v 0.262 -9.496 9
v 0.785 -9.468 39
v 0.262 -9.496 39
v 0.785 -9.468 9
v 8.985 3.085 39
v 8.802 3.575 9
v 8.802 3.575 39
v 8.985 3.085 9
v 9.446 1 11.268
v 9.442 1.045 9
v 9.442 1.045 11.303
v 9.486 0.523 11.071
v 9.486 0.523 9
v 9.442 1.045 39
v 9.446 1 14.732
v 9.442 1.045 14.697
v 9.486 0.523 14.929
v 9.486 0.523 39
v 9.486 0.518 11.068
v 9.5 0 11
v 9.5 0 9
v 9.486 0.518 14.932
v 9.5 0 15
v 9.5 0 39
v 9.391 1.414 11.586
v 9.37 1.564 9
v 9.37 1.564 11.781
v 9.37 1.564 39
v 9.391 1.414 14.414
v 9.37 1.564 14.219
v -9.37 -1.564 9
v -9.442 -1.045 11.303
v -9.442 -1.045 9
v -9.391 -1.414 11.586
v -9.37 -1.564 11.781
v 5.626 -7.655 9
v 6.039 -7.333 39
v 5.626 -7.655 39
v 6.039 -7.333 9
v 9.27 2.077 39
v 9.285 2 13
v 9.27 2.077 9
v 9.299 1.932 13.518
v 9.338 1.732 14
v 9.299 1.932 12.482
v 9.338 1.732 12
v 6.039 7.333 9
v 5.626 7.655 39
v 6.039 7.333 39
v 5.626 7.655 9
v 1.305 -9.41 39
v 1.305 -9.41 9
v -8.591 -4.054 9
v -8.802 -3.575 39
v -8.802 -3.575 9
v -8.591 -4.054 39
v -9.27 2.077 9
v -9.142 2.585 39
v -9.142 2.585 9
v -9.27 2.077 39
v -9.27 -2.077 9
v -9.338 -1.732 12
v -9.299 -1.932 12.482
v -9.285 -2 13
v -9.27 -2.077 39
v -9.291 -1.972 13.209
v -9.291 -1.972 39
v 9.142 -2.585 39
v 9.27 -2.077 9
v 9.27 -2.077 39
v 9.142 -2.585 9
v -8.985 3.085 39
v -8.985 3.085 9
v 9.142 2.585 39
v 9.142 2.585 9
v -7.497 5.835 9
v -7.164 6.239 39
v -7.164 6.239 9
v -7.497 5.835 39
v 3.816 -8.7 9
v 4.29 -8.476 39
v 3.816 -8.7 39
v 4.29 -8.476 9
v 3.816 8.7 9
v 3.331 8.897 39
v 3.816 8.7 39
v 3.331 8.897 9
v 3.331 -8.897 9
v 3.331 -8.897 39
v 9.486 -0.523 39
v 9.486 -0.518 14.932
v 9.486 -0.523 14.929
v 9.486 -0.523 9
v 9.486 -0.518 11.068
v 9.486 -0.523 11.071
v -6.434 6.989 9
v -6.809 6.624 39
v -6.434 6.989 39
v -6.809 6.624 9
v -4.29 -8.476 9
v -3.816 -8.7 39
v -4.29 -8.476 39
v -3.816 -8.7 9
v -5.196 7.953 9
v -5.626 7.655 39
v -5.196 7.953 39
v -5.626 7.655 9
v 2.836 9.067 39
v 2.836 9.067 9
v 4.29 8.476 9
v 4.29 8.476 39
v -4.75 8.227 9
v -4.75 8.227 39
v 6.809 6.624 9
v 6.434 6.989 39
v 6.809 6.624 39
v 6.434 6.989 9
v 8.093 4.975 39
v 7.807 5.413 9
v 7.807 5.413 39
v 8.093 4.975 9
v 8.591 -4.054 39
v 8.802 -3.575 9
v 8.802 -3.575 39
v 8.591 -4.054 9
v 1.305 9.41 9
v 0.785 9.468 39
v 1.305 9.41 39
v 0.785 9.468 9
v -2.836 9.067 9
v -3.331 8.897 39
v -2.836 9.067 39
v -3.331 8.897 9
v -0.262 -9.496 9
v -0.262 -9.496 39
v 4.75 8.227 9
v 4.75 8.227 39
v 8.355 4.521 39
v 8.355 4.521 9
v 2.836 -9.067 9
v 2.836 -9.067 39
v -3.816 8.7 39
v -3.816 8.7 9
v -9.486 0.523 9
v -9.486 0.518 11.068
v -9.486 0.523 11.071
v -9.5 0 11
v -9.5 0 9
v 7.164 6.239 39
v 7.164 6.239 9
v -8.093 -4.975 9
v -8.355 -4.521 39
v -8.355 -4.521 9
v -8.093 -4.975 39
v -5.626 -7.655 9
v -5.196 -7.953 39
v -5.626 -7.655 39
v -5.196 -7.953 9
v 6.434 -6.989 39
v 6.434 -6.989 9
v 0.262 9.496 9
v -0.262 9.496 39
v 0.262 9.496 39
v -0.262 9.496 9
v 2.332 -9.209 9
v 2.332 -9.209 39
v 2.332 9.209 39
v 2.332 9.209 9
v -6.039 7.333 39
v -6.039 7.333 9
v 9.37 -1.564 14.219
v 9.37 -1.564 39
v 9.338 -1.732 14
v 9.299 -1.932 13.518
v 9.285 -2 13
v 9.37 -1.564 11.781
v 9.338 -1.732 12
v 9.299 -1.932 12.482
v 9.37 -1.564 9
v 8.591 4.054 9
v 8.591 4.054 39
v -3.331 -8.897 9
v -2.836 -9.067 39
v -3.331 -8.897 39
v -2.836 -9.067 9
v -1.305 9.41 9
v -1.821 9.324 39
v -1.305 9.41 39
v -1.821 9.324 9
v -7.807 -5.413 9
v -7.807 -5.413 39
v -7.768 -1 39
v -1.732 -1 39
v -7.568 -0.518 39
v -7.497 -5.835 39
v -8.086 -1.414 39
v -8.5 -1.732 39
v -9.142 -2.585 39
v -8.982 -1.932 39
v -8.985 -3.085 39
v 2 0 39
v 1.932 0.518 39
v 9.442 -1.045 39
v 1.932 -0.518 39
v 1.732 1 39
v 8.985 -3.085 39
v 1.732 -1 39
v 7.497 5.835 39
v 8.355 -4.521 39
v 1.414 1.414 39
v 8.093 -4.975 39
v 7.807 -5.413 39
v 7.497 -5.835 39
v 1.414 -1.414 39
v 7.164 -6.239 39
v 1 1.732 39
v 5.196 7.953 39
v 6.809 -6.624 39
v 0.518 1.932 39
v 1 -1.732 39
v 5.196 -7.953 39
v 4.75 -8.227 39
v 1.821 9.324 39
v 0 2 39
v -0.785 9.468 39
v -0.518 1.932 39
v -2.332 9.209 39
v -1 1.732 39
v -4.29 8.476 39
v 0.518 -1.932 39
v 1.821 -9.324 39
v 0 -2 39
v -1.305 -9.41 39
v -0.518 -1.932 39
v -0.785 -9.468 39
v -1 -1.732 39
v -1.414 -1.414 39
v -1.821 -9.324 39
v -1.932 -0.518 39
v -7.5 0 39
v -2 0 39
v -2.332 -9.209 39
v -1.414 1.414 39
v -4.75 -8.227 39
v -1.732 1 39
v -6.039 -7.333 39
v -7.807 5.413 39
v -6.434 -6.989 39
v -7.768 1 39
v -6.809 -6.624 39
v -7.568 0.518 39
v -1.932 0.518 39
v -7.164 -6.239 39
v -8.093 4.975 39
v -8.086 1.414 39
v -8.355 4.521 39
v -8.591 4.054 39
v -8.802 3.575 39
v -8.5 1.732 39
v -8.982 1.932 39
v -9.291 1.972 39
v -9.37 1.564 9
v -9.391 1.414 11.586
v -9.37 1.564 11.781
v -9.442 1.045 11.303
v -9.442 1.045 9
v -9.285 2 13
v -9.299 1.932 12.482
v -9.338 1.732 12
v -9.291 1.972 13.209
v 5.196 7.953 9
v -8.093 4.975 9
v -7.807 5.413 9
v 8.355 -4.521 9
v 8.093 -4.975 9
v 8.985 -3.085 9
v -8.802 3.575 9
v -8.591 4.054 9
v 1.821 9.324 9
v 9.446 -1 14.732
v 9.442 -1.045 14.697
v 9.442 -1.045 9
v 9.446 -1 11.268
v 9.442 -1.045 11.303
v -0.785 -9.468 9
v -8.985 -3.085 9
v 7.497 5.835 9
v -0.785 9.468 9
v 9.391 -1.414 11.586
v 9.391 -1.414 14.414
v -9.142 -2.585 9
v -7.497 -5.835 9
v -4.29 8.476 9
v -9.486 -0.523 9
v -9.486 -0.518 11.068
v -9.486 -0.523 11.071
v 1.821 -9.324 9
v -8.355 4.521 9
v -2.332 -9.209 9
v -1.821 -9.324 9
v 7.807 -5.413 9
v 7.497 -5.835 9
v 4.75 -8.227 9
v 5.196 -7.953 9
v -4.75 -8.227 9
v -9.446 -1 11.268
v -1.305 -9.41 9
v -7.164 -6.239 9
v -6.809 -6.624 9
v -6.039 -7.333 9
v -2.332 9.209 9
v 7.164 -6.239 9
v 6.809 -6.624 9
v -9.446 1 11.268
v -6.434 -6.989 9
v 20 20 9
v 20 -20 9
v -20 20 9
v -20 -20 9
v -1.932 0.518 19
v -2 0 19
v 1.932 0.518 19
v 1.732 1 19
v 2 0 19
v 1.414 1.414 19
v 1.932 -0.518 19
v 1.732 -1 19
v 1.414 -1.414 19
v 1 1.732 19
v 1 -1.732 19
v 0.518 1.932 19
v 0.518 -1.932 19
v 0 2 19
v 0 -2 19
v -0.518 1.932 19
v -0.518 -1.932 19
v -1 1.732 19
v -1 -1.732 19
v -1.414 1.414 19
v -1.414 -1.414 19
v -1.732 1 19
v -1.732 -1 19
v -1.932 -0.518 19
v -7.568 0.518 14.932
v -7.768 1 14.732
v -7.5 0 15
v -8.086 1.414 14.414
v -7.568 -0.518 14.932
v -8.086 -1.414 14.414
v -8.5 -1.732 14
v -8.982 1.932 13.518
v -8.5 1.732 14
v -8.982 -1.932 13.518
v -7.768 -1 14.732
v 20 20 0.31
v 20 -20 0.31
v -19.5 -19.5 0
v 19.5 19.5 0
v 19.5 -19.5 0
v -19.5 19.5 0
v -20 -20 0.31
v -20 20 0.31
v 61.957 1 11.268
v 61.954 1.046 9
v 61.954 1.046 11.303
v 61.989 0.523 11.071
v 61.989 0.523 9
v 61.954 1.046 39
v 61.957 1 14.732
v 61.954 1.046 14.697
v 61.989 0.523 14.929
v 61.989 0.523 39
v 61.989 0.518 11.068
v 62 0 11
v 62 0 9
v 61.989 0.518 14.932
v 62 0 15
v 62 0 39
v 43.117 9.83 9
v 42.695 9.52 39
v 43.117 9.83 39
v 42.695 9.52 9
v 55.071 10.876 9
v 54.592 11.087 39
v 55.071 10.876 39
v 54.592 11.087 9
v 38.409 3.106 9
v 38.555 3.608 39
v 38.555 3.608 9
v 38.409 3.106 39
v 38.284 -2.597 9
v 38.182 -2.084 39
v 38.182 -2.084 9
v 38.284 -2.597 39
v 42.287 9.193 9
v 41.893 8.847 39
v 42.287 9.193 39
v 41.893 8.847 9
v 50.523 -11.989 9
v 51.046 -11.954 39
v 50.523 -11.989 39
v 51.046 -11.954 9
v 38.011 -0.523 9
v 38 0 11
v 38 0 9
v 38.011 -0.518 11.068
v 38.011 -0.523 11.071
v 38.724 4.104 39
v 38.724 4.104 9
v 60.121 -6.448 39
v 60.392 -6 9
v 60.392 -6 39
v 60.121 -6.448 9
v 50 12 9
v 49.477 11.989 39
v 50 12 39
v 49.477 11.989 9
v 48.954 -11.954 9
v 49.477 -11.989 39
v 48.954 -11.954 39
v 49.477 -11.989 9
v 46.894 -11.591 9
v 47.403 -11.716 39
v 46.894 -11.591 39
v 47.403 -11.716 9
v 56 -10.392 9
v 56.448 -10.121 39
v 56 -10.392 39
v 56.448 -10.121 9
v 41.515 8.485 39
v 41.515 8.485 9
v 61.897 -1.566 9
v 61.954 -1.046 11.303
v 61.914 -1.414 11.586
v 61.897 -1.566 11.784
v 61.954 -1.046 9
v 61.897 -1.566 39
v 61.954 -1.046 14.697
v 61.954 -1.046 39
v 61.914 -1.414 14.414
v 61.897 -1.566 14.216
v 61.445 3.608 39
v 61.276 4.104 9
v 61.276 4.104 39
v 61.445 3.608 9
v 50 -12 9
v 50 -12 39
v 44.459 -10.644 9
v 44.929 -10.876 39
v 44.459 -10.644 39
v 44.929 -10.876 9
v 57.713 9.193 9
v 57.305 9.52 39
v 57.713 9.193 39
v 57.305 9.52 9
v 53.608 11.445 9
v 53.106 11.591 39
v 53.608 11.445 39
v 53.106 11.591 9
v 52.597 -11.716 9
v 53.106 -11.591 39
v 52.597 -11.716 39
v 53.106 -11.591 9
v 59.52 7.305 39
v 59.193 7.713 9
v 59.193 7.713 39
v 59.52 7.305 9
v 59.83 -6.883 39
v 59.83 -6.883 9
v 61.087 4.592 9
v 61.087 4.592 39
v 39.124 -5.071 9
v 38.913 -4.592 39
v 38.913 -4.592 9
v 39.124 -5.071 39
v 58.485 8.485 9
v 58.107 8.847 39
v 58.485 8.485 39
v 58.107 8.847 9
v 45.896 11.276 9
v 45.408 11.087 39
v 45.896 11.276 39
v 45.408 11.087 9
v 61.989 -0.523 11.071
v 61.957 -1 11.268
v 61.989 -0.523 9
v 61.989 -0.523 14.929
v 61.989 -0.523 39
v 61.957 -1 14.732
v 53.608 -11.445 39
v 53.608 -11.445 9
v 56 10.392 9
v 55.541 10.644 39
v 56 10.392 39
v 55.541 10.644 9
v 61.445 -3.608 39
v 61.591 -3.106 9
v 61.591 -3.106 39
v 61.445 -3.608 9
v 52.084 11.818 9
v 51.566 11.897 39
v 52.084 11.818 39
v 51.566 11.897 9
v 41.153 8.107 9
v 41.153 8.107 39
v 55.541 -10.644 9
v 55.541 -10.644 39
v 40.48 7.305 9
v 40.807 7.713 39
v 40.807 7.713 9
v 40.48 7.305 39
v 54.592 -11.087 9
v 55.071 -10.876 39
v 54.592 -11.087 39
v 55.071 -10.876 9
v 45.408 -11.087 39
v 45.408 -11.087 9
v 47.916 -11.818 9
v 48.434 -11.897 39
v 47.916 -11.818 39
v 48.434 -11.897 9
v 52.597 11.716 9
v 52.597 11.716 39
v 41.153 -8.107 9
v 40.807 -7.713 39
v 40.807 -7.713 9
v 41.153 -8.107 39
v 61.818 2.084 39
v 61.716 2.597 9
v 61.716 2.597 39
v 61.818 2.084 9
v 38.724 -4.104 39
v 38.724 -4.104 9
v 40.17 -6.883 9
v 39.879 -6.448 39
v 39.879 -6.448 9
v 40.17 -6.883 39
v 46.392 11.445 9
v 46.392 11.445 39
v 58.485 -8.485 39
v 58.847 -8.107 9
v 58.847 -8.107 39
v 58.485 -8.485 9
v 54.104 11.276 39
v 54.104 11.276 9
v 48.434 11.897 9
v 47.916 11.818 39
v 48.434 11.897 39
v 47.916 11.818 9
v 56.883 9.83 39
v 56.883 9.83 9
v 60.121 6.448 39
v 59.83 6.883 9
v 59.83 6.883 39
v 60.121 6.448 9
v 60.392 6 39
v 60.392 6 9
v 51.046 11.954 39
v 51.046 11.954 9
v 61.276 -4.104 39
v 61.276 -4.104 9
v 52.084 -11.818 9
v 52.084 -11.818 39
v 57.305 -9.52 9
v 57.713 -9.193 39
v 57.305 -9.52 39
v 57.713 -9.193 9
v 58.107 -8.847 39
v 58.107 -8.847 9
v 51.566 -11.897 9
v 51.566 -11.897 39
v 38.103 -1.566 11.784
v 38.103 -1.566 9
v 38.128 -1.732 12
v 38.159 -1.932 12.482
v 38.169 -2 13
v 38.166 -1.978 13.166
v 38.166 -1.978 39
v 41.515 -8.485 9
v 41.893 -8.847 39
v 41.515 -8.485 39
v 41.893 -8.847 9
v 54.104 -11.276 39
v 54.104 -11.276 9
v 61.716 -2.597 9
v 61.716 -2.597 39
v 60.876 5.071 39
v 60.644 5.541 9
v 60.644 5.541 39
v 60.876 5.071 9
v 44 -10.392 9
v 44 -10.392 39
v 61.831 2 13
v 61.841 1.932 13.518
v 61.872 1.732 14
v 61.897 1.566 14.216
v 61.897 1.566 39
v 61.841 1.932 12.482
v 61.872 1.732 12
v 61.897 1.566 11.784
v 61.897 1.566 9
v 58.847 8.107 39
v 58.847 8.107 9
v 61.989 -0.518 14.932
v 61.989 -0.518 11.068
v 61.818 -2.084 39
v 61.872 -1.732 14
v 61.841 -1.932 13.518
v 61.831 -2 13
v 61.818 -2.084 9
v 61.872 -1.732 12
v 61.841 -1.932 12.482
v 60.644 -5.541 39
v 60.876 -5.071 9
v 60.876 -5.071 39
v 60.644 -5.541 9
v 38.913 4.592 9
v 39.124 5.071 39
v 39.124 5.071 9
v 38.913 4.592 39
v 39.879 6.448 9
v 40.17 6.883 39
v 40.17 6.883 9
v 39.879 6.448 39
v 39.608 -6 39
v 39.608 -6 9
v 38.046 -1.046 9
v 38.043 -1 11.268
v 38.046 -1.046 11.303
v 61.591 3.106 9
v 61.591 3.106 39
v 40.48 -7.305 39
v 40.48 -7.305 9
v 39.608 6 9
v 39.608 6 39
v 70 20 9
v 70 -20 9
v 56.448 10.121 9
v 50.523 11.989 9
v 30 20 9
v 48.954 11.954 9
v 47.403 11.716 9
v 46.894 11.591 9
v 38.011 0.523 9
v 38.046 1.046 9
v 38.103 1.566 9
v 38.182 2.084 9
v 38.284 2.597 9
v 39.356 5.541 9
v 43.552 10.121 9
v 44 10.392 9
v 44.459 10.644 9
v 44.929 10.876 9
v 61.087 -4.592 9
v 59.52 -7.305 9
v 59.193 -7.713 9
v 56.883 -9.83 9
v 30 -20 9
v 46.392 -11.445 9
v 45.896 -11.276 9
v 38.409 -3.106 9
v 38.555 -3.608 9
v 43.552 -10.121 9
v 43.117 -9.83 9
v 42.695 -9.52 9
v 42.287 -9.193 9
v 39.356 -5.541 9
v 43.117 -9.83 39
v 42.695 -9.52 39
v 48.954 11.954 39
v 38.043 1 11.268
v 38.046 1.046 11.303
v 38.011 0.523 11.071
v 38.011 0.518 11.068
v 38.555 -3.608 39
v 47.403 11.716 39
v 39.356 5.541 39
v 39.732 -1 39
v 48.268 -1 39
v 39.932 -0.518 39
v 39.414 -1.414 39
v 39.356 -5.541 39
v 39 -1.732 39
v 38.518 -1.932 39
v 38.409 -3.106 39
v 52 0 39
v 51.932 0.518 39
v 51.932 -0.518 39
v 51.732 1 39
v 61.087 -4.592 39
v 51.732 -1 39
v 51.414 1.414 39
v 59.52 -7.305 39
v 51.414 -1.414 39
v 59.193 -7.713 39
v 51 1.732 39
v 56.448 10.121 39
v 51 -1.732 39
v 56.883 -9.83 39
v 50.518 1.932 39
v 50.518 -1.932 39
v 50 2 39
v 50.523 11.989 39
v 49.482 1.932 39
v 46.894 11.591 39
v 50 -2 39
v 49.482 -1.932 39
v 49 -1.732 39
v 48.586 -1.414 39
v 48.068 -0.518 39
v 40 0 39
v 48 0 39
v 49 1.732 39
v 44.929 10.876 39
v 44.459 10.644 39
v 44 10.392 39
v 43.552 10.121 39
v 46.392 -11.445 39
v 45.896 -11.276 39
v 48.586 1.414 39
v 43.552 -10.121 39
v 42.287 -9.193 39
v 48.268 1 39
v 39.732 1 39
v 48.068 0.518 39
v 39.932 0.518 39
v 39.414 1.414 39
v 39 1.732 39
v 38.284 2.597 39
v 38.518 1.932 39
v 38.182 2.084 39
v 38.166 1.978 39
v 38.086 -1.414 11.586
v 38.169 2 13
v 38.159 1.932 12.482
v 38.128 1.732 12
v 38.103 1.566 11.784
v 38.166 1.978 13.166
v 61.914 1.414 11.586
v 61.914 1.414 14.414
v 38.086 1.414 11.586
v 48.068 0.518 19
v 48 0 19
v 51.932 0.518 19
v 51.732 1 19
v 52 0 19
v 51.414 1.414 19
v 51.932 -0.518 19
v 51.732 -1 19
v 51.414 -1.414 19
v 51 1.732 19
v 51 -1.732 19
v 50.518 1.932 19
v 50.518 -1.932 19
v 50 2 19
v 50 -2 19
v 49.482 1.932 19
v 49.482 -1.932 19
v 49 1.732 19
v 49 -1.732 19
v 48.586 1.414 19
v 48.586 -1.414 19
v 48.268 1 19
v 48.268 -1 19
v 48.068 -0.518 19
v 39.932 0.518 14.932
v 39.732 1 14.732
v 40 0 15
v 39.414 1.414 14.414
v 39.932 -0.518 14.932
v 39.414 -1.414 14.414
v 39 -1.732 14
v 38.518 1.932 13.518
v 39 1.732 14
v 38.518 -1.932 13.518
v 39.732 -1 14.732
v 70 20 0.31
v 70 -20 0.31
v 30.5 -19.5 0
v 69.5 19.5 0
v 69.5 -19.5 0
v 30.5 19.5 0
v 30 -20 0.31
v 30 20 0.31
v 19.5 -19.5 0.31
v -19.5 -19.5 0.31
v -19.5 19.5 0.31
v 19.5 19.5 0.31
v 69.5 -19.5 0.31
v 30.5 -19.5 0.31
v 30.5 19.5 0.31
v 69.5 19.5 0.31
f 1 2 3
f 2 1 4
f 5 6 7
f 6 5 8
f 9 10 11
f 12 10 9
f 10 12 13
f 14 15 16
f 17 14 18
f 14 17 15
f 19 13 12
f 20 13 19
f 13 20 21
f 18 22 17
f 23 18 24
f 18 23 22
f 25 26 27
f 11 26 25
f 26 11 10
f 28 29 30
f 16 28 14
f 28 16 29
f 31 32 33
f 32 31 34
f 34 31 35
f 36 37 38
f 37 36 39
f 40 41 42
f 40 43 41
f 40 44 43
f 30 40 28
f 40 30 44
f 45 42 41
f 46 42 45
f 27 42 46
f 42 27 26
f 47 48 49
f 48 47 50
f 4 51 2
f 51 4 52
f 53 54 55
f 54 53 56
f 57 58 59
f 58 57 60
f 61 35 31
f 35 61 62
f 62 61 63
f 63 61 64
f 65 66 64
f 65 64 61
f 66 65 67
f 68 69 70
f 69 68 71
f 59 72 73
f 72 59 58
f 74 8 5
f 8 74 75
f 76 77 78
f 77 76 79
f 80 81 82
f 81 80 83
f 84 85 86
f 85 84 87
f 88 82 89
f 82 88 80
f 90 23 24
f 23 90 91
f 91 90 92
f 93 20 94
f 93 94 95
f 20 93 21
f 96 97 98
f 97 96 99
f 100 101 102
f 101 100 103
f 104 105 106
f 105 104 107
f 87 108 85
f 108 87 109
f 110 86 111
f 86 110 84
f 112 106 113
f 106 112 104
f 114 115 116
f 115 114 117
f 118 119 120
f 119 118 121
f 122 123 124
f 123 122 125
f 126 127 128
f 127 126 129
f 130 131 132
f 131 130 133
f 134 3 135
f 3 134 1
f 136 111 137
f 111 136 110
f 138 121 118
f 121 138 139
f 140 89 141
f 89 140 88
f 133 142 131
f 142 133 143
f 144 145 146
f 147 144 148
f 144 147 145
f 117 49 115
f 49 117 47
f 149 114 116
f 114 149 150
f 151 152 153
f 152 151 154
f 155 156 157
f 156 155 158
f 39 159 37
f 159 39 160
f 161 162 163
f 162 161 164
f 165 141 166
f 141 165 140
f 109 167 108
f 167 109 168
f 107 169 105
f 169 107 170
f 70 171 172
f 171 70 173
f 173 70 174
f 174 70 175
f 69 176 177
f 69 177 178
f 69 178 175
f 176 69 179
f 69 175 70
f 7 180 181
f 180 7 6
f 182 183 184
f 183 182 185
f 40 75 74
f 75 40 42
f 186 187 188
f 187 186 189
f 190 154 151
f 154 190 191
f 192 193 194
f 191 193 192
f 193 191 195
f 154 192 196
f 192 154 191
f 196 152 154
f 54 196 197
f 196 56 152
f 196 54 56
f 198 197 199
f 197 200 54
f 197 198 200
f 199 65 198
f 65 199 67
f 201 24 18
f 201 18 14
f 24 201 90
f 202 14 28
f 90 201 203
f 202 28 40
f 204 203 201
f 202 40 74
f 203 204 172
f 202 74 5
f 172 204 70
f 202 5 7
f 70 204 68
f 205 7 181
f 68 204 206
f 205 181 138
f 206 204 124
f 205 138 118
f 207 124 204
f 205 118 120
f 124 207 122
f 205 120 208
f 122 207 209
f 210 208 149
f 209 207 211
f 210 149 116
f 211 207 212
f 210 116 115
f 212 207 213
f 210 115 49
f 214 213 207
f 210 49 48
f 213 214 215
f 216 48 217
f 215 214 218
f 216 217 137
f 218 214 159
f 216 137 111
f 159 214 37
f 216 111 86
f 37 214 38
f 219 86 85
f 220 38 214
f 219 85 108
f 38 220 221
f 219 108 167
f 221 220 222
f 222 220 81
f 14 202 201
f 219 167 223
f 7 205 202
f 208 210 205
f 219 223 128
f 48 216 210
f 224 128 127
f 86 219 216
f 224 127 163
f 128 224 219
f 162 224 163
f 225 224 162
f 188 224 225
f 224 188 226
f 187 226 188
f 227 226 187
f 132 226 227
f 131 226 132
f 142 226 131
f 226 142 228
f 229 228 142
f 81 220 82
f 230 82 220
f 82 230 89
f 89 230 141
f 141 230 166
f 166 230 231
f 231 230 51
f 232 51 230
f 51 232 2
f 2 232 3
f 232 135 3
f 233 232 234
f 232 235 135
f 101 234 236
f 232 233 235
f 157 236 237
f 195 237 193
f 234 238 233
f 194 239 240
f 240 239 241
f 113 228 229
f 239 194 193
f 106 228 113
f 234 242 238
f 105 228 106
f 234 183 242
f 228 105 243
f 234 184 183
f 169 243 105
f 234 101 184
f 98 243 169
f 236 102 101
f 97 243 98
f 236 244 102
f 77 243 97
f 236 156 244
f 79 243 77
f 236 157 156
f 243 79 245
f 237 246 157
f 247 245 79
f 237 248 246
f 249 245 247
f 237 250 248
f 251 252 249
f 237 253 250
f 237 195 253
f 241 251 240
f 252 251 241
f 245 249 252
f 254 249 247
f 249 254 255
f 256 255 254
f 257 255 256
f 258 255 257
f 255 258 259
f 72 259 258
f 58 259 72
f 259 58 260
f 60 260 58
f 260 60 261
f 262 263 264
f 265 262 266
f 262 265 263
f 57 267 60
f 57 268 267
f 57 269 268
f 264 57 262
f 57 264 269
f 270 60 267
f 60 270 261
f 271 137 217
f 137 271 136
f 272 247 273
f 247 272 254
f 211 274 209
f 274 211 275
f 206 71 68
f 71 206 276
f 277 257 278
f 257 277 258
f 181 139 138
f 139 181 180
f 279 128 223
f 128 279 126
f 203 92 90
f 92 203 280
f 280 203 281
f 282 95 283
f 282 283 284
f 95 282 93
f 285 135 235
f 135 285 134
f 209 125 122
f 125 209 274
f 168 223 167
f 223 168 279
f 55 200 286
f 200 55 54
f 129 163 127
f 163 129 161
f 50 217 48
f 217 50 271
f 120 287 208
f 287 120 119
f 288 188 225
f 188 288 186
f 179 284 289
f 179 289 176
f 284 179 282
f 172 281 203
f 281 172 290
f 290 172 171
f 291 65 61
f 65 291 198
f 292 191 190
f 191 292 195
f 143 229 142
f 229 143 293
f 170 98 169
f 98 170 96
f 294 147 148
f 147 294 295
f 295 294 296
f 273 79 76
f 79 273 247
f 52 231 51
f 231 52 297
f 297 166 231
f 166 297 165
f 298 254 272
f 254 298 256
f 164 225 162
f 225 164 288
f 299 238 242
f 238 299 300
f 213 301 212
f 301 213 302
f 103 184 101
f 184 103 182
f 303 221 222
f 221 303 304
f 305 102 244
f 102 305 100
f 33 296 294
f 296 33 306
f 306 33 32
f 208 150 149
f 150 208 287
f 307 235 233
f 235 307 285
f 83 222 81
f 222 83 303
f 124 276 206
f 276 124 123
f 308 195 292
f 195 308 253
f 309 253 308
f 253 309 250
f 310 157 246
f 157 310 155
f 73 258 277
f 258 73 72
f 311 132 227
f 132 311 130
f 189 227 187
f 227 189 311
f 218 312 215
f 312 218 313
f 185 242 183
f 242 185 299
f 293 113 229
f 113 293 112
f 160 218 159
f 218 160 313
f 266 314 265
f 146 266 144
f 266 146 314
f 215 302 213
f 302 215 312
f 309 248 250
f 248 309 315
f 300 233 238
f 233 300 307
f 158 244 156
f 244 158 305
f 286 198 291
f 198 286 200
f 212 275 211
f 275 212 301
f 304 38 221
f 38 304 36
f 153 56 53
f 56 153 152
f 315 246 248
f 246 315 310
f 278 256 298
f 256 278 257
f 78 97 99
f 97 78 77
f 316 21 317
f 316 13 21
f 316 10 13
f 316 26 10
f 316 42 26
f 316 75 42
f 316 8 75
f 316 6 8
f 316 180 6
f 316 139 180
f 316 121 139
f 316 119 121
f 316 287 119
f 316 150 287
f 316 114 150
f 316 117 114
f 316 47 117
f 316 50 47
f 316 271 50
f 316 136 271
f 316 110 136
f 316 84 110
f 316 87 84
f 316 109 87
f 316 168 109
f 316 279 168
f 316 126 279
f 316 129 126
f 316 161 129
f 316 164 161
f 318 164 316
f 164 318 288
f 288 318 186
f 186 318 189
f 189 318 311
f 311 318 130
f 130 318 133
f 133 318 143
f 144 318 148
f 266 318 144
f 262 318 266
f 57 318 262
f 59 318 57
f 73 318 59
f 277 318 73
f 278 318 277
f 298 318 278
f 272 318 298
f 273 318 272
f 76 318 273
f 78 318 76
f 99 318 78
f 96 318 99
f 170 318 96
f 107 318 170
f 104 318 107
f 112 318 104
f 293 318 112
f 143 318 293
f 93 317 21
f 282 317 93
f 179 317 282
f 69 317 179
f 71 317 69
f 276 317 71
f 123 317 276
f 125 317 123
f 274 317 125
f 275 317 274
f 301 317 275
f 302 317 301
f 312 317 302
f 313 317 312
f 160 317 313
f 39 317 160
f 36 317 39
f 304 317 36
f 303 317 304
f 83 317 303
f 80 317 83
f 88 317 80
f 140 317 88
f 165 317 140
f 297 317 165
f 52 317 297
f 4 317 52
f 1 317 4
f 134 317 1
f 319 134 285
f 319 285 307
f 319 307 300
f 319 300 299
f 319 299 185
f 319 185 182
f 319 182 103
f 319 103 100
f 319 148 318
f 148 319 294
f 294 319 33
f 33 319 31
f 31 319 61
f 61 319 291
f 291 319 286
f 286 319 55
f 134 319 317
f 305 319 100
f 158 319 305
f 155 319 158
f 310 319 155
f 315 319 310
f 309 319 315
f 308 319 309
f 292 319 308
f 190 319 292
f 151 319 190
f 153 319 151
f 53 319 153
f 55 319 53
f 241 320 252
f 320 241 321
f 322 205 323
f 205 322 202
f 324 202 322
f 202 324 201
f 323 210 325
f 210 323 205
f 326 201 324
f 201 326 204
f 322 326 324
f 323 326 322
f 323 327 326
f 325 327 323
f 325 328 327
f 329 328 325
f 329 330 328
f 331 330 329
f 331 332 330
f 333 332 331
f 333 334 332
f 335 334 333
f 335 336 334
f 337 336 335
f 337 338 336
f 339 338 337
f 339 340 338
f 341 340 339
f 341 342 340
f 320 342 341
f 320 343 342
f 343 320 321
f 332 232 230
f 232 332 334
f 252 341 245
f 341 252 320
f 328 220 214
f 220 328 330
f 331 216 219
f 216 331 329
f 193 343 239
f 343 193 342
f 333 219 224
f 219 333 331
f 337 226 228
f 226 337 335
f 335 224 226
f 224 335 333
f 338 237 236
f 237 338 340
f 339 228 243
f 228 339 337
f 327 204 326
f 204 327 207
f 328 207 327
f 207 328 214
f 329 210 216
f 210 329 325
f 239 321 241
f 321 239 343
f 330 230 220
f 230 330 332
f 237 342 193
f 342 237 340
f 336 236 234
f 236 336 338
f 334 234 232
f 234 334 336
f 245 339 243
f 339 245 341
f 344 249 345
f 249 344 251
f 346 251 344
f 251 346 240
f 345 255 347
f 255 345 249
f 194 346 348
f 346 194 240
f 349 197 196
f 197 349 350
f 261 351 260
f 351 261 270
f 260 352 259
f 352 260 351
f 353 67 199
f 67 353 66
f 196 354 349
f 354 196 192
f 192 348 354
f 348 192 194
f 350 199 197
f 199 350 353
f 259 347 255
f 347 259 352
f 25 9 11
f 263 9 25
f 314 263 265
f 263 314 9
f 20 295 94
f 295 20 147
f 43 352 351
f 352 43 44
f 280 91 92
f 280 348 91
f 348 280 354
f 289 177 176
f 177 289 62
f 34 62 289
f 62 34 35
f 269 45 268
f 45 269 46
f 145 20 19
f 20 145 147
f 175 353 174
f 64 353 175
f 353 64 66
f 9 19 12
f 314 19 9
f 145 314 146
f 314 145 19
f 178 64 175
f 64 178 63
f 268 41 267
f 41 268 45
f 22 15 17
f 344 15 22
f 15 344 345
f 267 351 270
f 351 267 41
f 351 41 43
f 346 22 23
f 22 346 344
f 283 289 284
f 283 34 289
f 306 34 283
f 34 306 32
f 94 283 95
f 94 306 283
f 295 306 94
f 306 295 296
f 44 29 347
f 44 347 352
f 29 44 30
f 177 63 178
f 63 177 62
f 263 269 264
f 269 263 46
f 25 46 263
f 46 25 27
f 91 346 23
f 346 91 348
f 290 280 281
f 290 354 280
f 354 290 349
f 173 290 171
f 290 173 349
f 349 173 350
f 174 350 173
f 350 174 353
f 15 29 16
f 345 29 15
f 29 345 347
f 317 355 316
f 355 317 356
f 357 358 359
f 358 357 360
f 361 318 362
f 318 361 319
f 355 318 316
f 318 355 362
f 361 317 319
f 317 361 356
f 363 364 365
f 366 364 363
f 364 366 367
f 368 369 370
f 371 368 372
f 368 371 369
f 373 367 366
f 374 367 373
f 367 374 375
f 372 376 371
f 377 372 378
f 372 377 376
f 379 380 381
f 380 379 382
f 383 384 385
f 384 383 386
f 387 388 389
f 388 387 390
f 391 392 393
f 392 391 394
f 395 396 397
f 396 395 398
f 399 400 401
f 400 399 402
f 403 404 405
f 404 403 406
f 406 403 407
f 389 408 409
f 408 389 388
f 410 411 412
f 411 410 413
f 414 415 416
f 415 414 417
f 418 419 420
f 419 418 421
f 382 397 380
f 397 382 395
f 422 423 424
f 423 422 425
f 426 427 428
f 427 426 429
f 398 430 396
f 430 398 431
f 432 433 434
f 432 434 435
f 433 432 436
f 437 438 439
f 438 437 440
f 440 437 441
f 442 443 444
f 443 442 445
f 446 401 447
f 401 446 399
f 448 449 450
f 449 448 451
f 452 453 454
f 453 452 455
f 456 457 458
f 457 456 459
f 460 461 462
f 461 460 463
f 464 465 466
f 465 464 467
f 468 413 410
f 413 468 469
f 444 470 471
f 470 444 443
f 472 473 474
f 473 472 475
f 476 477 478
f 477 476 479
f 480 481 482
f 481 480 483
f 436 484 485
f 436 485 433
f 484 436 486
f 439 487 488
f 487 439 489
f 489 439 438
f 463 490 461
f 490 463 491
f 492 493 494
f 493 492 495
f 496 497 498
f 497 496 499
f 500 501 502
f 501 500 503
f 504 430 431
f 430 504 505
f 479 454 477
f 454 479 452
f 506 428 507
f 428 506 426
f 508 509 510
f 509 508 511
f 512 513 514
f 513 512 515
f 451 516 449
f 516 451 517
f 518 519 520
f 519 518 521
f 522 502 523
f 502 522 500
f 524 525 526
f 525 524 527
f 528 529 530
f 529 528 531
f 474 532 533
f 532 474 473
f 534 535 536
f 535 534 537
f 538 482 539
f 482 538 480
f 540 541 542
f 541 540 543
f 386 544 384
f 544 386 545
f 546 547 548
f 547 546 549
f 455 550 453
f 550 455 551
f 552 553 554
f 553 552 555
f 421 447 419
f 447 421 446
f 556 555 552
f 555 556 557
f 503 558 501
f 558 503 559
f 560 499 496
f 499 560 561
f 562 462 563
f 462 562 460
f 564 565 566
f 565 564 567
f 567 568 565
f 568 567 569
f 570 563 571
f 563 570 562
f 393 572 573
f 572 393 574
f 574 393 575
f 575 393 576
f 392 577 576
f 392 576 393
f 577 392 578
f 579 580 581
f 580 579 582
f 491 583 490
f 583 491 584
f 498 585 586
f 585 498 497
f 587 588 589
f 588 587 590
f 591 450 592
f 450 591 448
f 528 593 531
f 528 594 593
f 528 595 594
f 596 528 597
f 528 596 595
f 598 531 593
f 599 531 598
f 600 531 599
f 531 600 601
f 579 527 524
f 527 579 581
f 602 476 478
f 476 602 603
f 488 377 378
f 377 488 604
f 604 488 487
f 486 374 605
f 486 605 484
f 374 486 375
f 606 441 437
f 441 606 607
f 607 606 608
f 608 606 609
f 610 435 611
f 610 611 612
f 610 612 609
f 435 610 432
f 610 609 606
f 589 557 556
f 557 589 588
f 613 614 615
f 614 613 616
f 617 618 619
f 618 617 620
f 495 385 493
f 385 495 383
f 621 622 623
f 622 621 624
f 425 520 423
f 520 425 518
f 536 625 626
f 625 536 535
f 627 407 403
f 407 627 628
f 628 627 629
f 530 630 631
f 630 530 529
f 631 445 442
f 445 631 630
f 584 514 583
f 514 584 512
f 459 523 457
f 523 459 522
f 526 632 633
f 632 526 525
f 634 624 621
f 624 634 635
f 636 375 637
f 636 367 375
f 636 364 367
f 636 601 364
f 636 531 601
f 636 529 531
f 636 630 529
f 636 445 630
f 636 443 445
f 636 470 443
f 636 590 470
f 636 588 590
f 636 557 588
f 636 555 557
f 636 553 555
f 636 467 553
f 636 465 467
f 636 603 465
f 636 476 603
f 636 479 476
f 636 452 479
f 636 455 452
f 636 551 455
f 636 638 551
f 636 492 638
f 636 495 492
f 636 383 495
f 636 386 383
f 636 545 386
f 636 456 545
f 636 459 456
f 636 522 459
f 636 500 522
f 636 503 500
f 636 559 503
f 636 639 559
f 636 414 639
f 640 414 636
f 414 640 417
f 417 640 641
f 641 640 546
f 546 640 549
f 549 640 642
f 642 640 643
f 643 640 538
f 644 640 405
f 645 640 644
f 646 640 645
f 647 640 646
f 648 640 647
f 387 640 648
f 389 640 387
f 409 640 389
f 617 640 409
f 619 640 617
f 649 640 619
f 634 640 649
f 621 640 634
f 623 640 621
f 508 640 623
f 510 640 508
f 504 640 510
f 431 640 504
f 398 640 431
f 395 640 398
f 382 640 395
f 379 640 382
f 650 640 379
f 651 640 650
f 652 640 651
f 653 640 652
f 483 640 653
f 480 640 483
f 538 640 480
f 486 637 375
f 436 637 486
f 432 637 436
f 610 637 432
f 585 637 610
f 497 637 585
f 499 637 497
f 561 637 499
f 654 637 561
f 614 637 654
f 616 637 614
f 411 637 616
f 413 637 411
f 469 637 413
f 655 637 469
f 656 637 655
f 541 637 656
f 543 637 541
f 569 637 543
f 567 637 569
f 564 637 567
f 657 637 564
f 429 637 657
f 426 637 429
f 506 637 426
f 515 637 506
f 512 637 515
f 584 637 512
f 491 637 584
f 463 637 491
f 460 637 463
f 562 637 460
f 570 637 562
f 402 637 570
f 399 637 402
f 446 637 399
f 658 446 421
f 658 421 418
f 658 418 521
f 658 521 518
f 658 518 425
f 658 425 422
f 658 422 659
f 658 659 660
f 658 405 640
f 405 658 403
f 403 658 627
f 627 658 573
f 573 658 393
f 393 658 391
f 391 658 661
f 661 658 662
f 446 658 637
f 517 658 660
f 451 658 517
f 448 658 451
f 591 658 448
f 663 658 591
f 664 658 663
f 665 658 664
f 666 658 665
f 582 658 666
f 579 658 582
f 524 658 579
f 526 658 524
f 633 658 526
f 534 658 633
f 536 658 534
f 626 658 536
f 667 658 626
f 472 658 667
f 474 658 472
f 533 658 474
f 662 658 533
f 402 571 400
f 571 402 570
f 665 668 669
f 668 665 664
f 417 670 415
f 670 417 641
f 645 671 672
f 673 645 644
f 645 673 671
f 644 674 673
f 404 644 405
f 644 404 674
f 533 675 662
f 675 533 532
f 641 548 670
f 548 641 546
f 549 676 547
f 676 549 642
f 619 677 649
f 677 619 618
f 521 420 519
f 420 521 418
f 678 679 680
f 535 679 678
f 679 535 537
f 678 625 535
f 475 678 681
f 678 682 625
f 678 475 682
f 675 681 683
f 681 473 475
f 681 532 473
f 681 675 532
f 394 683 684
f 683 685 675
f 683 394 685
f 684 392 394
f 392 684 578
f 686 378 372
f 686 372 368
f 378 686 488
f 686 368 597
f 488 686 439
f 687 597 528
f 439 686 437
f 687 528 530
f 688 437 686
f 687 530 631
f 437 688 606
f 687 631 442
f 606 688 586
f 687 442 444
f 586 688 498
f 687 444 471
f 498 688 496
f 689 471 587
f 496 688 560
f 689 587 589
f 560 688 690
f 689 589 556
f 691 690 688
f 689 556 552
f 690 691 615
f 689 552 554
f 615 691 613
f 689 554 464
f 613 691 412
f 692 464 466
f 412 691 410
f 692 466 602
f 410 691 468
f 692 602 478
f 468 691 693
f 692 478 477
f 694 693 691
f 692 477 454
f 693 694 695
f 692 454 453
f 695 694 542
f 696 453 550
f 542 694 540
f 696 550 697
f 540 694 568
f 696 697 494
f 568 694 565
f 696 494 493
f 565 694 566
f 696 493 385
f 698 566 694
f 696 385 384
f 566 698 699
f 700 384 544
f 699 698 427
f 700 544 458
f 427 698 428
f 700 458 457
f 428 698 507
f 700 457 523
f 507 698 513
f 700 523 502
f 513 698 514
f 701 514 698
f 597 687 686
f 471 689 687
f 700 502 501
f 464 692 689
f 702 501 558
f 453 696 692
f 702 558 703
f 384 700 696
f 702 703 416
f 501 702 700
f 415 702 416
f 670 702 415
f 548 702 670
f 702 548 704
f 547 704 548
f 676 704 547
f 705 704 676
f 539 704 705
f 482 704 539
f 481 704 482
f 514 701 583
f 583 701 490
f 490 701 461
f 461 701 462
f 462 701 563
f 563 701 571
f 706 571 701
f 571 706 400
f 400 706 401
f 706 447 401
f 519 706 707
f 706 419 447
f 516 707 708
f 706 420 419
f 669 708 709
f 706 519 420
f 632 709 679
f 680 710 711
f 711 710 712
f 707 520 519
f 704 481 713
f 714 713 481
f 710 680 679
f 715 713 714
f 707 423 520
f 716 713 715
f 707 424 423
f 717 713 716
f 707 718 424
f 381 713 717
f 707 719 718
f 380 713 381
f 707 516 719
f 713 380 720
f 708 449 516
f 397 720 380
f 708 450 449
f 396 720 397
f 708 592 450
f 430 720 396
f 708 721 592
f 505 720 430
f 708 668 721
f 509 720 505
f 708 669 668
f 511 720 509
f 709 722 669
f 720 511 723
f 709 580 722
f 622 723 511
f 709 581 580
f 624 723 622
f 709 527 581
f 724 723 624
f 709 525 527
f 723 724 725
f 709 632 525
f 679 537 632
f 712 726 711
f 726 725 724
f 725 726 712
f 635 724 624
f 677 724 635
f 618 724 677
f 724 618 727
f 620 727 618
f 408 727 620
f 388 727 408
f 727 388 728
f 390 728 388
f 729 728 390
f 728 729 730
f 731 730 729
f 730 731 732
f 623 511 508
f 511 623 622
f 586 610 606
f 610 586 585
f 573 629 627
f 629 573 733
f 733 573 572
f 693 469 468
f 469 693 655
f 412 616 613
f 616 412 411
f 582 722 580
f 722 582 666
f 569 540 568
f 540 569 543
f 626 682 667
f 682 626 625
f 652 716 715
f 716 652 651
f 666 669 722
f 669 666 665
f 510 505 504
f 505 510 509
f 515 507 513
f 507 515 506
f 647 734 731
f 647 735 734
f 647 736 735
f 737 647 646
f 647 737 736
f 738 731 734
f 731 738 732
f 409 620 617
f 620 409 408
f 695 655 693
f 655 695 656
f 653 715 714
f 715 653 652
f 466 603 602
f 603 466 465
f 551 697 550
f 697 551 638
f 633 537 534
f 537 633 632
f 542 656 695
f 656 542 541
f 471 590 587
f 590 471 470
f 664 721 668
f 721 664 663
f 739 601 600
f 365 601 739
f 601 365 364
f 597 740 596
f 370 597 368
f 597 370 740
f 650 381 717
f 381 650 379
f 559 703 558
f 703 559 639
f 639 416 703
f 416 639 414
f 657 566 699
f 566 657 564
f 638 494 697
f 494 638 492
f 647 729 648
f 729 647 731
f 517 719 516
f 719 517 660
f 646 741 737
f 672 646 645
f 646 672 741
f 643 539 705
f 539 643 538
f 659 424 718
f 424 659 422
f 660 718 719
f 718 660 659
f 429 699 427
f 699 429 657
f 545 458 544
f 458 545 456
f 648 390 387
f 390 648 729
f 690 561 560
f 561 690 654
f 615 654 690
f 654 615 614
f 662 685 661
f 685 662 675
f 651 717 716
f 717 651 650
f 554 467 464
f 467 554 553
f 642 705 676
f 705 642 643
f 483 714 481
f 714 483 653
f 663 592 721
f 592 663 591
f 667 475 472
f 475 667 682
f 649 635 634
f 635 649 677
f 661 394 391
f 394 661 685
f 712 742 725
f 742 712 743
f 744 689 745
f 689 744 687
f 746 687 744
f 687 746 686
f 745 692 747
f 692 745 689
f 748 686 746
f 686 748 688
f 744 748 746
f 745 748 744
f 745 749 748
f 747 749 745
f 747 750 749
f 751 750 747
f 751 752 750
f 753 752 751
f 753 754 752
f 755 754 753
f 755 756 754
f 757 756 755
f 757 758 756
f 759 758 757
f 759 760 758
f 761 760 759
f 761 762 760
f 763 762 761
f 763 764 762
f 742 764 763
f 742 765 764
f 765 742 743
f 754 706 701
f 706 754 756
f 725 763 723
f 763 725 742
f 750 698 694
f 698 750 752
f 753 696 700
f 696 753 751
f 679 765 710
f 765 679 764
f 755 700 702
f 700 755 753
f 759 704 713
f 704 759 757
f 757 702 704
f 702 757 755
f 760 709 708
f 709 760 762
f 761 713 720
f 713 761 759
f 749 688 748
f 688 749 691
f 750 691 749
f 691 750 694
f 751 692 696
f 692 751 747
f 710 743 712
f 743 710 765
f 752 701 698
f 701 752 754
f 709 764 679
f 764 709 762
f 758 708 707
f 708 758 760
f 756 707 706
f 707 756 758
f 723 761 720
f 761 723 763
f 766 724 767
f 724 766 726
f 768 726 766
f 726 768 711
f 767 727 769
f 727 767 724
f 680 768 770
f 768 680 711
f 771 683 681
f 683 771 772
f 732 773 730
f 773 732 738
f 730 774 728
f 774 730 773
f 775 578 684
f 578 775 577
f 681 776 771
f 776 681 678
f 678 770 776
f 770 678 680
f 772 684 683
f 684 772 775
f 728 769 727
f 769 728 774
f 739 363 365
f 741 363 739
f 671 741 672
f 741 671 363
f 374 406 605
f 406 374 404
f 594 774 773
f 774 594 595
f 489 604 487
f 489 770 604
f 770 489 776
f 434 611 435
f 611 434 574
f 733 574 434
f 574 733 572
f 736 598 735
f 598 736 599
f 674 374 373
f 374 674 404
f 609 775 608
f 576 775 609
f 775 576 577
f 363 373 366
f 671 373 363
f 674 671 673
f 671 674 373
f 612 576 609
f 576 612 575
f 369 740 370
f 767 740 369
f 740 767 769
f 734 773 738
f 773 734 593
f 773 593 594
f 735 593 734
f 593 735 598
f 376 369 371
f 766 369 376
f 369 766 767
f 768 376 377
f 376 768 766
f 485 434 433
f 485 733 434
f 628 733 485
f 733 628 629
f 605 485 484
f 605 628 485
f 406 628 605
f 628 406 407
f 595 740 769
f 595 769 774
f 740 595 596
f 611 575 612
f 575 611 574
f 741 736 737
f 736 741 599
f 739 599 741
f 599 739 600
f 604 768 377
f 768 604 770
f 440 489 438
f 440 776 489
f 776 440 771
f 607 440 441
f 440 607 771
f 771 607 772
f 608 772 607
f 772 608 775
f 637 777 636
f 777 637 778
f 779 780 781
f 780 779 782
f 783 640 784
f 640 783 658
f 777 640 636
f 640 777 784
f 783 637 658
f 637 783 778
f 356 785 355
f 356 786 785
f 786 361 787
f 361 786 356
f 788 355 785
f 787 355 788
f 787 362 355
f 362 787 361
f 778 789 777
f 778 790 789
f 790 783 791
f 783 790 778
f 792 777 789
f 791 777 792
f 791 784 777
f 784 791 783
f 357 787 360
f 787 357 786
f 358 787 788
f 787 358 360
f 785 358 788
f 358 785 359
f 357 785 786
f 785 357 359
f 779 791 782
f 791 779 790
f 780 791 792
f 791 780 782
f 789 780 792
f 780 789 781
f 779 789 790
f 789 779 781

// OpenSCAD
// file: atis_lib.scad
module gyuru(r1, r2,h, w, center=false){
    difference(){
        cylinder(r1=r1,r2=r2,h, center=center, $fn=12*r1);
        cylinder(r1=r1-w, r2=r2-w,h, center=center, $fn=12*(r1-w));
    }
}

//inset_width= min(nozzle dia/2, 0.4)
module inset_first_layer(inset_height=0.31,inset_width=0.2, render=false)
{   
    if (render == true){
        difference()
        { 
            children();

            translate([0,0,-1])
            linear_extrude(height=inset_height+1)
            difference()
            {
                offset(r = inset_width) 
                projection(cut=true) 
                translate([0,0,-inset_height])
                children();

                offset(r = -inset_width) 
                projection(cut=true) 
                translate([0,0,-inset_height])
                children();
            }
        } 
    }
    else{
        echo("Inset not rendered!");
    }
} 

module deszka(m, sz, v, cimke){
    cube([m,sz,v], center=true);
    if (m == vastagsag){
        t = sz * v;
        echo(cimke, m , sz, v, t/1000/1000);
    }
    if (sz == vastagsag){
        t = m*v;
        echo(cimke, m , sz, v, t/1000/1000);
    }
    if (v == vastagsag){
        t = m*sz;
        echo(cimke, m , sz, v, t/1000/1000);
    }
    //echo(cimke, m , sz, v, t);
}
// main file
use  <atis_lib.scad>;

//egyenes_2lyukas_benchdog();
inset_first_layer(inset_height=0.31,inset_width=0.5, render=true){
translate([0,0,4.5]){hengeres_elem();
translate([50,0,0])hengeres_elem(12);
}
}

//derekszogu_3lyukas_benchdog();

module hengeres_elem(r_kulso=9.5, r_rugo=2){
    cube([40,40,9], center=true);
    translate([0,0,4.5])difference(){
        cylinder(r=r_kulso,h=30, $fn=r_kulso*12);
        translate([0,0,10])cylinder(r=r_rugo,h=250, $fn=r_rugo*12);
        translate([-r_kulso,0,4])cylinder(r=r_rugo,h=50, $fn=r_rugo*12);
        translate([-r_kulso,0,4])rotate([0,90,0])cylinder(r=r_rugo,h=50, $fn=r_rugo*12);                        
    }
}
module egyenes_2lyukas_benchdog(){ // makeme
    //inset_first_layer(inset_height=0.31,inset_width=0.5, render=true)
    {
        translate([0,12.5,0]){
            hengeres_elem();
        }
        translate([100,12,0])rotate(180)hengeres_elem(r_kulso=12, r_rugo=2);
        translate([0,12,0]) cylinder(r=12,h=9, $fn=12*12.5);
        linear_extrude(height=9) polygon(points=[[0,24],[100,24],[100,0], [0,0],[0,26]]);
    }
}

module derekszogu_3lyukas_benchdog(){ // makeme
    translate([0,-12.5,0])egyenes_2lyukas_benchdog();
    rotate(90)translate([0,-12.5,0])egyenes_2lyukas_benchdog();
}
